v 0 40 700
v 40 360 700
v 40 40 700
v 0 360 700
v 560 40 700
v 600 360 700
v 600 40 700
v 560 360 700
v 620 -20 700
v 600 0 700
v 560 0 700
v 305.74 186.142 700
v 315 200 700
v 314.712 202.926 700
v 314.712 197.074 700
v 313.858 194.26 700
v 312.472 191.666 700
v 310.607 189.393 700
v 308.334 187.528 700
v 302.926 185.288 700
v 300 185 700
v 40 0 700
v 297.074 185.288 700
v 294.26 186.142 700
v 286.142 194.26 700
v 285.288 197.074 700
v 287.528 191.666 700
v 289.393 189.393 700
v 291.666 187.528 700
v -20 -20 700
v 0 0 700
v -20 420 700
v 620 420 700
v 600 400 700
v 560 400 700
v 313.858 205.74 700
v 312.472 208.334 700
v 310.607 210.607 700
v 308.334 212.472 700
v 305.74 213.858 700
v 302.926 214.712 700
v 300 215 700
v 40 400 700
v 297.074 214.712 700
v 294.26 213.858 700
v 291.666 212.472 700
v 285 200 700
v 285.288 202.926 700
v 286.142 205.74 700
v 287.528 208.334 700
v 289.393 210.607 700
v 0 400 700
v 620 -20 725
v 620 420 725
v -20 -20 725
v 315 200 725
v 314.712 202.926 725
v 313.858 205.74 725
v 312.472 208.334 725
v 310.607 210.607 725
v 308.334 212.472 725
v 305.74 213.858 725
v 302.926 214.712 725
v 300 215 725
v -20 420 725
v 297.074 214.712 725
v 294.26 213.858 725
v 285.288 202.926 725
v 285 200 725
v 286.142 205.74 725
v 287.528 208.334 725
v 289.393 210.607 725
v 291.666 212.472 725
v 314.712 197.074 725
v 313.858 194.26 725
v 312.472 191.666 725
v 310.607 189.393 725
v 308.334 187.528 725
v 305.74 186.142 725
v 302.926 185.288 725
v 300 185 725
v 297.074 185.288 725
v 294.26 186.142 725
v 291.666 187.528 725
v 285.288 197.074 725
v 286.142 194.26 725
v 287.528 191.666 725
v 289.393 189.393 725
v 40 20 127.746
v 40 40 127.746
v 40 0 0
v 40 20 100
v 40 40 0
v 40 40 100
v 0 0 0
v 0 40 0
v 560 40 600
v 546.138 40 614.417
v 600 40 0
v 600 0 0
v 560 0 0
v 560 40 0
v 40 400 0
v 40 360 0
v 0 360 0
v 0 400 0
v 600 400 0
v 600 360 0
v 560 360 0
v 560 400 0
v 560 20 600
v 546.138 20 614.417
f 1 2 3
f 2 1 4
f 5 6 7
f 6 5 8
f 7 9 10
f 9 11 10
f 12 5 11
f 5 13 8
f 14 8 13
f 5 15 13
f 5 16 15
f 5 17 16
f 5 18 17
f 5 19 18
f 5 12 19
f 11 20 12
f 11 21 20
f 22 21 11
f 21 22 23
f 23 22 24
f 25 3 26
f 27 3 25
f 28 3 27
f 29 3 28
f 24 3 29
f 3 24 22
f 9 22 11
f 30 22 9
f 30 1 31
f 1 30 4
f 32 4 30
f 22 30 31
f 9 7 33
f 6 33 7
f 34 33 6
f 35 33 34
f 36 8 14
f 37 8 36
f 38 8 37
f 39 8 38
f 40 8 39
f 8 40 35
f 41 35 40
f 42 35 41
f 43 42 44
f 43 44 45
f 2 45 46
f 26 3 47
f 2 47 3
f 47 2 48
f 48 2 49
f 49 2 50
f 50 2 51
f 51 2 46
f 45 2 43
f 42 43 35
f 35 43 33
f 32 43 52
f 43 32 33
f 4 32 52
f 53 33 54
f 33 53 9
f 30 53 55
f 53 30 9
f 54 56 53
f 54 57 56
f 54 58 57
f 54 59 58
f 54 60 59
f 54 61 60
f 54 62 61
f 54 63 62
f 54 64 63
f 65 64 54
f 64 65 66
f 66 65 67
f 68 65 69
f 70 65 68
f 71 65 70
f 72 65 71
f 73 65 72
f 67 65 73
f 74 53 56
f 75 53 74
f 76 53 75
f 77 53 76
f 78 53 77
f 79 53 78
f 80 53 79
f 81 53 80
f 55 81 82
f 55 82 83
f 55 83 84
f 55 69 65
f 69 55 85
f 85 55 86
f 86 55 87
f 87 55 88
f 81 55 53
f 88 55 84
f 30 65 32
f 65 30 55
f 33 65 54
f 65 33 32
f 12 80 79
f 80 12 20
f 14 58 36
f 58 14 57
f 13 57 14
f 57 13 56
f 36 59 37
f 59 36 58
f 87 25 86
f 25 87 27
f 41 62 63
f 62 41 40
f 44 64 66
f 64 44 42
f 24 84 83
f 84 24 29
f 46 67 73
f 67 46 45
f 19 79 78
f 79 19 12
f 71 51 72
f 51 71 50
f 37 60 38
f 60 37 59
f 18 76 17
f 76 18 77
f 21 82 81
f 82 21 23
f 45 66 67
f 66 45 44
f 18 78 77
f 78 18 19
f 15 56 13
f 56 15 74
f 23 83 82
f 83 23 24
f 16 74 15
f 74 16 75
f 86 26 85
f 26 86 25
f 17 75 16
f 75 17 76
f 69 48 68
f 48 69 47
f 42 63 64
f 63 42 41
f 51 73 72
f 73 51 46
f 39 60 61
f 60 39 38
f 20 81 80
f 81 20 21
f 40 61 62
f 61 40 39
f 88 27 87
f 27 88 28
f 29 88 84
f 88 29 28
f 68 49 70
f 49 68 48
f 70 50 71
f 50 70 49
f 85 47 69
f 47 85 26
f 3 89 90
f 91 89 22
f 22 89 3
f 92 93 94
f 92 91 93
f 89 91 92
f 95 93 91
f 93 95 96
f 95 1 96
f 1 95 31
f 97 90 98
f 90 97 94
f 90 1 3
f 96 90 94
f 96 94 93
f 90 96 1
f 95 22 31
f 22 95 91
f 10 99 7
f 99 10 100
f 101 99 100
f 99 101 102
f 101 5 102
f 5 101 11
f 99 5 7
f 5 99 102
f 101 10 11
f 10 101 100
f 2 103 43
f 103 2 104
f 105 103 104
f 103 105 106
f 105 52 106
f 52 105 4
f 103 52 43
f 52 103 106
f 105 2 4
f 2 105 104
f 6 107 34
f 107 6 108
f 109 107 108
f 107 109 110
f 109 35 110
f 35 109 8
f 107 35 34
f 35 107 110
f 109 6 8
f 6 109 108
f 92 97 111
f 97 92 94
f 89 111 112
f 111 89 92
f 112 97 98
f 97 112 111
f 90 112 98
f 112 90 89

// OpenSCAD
// Archiyou -> OpenSCAD  |  script: table 0.1.0  |  units: mm
// OpenSCAD has no units: coordinates are in mm.
// Parts: 6 CSG, 0 baked, 0 2D
// Parameters at export, for reference only (nothing in this file is linked to them):
//   WIDTH = 600

$fn = 32;
PART = "";

module leg0() {
    translate([20, 20, 350]) cube([40, 40, 700], center = true);
}

module leg1() {
    translate([580, 20, 350]) cube([40, 40, 700], center = true);
}

module leg2() {
    translate([20, 380, 350]) cube([40, 40, 700], center = true);
}

module leg3() {
    translate([580, 380, 350]) cube([40, 40, 700], center = true);
}

module top() {
    color([0.69, 0.502, 0.314]) difference() {
        translate([-20, -20, 700]) linear_extrude(height = 25) polygon([[0, 0], [640, 0], [640, 440], [0, 440]]);
        translate([300, 200, 650]) cylinder(h = 100, r = 15);
    }
}

module brace() {
    multmatrix([[0.720833064902, 0, -0.693108716252, 40], [0, 1, 0, 20], [0.693108716252, 0, 0.720833064902, 100], [0, 0, 0, 1]]) linear_extrude(height = 20) polygon([[0, 0], [721.387551875, 0], [721.387551875, 20], [0, 20]]);
}

// 3D parts
if (PART == "" || PART == "leg0") leg0();
if (PART == "" || PART == "leg1") leg1();
if (PART == "" || PART == "leg2") leg2();
if (PART == "" || PART == "leg3") leg3();
if (PART == "" || PART == "top") top();
if (PART == "" || PART == "brace") brace();
